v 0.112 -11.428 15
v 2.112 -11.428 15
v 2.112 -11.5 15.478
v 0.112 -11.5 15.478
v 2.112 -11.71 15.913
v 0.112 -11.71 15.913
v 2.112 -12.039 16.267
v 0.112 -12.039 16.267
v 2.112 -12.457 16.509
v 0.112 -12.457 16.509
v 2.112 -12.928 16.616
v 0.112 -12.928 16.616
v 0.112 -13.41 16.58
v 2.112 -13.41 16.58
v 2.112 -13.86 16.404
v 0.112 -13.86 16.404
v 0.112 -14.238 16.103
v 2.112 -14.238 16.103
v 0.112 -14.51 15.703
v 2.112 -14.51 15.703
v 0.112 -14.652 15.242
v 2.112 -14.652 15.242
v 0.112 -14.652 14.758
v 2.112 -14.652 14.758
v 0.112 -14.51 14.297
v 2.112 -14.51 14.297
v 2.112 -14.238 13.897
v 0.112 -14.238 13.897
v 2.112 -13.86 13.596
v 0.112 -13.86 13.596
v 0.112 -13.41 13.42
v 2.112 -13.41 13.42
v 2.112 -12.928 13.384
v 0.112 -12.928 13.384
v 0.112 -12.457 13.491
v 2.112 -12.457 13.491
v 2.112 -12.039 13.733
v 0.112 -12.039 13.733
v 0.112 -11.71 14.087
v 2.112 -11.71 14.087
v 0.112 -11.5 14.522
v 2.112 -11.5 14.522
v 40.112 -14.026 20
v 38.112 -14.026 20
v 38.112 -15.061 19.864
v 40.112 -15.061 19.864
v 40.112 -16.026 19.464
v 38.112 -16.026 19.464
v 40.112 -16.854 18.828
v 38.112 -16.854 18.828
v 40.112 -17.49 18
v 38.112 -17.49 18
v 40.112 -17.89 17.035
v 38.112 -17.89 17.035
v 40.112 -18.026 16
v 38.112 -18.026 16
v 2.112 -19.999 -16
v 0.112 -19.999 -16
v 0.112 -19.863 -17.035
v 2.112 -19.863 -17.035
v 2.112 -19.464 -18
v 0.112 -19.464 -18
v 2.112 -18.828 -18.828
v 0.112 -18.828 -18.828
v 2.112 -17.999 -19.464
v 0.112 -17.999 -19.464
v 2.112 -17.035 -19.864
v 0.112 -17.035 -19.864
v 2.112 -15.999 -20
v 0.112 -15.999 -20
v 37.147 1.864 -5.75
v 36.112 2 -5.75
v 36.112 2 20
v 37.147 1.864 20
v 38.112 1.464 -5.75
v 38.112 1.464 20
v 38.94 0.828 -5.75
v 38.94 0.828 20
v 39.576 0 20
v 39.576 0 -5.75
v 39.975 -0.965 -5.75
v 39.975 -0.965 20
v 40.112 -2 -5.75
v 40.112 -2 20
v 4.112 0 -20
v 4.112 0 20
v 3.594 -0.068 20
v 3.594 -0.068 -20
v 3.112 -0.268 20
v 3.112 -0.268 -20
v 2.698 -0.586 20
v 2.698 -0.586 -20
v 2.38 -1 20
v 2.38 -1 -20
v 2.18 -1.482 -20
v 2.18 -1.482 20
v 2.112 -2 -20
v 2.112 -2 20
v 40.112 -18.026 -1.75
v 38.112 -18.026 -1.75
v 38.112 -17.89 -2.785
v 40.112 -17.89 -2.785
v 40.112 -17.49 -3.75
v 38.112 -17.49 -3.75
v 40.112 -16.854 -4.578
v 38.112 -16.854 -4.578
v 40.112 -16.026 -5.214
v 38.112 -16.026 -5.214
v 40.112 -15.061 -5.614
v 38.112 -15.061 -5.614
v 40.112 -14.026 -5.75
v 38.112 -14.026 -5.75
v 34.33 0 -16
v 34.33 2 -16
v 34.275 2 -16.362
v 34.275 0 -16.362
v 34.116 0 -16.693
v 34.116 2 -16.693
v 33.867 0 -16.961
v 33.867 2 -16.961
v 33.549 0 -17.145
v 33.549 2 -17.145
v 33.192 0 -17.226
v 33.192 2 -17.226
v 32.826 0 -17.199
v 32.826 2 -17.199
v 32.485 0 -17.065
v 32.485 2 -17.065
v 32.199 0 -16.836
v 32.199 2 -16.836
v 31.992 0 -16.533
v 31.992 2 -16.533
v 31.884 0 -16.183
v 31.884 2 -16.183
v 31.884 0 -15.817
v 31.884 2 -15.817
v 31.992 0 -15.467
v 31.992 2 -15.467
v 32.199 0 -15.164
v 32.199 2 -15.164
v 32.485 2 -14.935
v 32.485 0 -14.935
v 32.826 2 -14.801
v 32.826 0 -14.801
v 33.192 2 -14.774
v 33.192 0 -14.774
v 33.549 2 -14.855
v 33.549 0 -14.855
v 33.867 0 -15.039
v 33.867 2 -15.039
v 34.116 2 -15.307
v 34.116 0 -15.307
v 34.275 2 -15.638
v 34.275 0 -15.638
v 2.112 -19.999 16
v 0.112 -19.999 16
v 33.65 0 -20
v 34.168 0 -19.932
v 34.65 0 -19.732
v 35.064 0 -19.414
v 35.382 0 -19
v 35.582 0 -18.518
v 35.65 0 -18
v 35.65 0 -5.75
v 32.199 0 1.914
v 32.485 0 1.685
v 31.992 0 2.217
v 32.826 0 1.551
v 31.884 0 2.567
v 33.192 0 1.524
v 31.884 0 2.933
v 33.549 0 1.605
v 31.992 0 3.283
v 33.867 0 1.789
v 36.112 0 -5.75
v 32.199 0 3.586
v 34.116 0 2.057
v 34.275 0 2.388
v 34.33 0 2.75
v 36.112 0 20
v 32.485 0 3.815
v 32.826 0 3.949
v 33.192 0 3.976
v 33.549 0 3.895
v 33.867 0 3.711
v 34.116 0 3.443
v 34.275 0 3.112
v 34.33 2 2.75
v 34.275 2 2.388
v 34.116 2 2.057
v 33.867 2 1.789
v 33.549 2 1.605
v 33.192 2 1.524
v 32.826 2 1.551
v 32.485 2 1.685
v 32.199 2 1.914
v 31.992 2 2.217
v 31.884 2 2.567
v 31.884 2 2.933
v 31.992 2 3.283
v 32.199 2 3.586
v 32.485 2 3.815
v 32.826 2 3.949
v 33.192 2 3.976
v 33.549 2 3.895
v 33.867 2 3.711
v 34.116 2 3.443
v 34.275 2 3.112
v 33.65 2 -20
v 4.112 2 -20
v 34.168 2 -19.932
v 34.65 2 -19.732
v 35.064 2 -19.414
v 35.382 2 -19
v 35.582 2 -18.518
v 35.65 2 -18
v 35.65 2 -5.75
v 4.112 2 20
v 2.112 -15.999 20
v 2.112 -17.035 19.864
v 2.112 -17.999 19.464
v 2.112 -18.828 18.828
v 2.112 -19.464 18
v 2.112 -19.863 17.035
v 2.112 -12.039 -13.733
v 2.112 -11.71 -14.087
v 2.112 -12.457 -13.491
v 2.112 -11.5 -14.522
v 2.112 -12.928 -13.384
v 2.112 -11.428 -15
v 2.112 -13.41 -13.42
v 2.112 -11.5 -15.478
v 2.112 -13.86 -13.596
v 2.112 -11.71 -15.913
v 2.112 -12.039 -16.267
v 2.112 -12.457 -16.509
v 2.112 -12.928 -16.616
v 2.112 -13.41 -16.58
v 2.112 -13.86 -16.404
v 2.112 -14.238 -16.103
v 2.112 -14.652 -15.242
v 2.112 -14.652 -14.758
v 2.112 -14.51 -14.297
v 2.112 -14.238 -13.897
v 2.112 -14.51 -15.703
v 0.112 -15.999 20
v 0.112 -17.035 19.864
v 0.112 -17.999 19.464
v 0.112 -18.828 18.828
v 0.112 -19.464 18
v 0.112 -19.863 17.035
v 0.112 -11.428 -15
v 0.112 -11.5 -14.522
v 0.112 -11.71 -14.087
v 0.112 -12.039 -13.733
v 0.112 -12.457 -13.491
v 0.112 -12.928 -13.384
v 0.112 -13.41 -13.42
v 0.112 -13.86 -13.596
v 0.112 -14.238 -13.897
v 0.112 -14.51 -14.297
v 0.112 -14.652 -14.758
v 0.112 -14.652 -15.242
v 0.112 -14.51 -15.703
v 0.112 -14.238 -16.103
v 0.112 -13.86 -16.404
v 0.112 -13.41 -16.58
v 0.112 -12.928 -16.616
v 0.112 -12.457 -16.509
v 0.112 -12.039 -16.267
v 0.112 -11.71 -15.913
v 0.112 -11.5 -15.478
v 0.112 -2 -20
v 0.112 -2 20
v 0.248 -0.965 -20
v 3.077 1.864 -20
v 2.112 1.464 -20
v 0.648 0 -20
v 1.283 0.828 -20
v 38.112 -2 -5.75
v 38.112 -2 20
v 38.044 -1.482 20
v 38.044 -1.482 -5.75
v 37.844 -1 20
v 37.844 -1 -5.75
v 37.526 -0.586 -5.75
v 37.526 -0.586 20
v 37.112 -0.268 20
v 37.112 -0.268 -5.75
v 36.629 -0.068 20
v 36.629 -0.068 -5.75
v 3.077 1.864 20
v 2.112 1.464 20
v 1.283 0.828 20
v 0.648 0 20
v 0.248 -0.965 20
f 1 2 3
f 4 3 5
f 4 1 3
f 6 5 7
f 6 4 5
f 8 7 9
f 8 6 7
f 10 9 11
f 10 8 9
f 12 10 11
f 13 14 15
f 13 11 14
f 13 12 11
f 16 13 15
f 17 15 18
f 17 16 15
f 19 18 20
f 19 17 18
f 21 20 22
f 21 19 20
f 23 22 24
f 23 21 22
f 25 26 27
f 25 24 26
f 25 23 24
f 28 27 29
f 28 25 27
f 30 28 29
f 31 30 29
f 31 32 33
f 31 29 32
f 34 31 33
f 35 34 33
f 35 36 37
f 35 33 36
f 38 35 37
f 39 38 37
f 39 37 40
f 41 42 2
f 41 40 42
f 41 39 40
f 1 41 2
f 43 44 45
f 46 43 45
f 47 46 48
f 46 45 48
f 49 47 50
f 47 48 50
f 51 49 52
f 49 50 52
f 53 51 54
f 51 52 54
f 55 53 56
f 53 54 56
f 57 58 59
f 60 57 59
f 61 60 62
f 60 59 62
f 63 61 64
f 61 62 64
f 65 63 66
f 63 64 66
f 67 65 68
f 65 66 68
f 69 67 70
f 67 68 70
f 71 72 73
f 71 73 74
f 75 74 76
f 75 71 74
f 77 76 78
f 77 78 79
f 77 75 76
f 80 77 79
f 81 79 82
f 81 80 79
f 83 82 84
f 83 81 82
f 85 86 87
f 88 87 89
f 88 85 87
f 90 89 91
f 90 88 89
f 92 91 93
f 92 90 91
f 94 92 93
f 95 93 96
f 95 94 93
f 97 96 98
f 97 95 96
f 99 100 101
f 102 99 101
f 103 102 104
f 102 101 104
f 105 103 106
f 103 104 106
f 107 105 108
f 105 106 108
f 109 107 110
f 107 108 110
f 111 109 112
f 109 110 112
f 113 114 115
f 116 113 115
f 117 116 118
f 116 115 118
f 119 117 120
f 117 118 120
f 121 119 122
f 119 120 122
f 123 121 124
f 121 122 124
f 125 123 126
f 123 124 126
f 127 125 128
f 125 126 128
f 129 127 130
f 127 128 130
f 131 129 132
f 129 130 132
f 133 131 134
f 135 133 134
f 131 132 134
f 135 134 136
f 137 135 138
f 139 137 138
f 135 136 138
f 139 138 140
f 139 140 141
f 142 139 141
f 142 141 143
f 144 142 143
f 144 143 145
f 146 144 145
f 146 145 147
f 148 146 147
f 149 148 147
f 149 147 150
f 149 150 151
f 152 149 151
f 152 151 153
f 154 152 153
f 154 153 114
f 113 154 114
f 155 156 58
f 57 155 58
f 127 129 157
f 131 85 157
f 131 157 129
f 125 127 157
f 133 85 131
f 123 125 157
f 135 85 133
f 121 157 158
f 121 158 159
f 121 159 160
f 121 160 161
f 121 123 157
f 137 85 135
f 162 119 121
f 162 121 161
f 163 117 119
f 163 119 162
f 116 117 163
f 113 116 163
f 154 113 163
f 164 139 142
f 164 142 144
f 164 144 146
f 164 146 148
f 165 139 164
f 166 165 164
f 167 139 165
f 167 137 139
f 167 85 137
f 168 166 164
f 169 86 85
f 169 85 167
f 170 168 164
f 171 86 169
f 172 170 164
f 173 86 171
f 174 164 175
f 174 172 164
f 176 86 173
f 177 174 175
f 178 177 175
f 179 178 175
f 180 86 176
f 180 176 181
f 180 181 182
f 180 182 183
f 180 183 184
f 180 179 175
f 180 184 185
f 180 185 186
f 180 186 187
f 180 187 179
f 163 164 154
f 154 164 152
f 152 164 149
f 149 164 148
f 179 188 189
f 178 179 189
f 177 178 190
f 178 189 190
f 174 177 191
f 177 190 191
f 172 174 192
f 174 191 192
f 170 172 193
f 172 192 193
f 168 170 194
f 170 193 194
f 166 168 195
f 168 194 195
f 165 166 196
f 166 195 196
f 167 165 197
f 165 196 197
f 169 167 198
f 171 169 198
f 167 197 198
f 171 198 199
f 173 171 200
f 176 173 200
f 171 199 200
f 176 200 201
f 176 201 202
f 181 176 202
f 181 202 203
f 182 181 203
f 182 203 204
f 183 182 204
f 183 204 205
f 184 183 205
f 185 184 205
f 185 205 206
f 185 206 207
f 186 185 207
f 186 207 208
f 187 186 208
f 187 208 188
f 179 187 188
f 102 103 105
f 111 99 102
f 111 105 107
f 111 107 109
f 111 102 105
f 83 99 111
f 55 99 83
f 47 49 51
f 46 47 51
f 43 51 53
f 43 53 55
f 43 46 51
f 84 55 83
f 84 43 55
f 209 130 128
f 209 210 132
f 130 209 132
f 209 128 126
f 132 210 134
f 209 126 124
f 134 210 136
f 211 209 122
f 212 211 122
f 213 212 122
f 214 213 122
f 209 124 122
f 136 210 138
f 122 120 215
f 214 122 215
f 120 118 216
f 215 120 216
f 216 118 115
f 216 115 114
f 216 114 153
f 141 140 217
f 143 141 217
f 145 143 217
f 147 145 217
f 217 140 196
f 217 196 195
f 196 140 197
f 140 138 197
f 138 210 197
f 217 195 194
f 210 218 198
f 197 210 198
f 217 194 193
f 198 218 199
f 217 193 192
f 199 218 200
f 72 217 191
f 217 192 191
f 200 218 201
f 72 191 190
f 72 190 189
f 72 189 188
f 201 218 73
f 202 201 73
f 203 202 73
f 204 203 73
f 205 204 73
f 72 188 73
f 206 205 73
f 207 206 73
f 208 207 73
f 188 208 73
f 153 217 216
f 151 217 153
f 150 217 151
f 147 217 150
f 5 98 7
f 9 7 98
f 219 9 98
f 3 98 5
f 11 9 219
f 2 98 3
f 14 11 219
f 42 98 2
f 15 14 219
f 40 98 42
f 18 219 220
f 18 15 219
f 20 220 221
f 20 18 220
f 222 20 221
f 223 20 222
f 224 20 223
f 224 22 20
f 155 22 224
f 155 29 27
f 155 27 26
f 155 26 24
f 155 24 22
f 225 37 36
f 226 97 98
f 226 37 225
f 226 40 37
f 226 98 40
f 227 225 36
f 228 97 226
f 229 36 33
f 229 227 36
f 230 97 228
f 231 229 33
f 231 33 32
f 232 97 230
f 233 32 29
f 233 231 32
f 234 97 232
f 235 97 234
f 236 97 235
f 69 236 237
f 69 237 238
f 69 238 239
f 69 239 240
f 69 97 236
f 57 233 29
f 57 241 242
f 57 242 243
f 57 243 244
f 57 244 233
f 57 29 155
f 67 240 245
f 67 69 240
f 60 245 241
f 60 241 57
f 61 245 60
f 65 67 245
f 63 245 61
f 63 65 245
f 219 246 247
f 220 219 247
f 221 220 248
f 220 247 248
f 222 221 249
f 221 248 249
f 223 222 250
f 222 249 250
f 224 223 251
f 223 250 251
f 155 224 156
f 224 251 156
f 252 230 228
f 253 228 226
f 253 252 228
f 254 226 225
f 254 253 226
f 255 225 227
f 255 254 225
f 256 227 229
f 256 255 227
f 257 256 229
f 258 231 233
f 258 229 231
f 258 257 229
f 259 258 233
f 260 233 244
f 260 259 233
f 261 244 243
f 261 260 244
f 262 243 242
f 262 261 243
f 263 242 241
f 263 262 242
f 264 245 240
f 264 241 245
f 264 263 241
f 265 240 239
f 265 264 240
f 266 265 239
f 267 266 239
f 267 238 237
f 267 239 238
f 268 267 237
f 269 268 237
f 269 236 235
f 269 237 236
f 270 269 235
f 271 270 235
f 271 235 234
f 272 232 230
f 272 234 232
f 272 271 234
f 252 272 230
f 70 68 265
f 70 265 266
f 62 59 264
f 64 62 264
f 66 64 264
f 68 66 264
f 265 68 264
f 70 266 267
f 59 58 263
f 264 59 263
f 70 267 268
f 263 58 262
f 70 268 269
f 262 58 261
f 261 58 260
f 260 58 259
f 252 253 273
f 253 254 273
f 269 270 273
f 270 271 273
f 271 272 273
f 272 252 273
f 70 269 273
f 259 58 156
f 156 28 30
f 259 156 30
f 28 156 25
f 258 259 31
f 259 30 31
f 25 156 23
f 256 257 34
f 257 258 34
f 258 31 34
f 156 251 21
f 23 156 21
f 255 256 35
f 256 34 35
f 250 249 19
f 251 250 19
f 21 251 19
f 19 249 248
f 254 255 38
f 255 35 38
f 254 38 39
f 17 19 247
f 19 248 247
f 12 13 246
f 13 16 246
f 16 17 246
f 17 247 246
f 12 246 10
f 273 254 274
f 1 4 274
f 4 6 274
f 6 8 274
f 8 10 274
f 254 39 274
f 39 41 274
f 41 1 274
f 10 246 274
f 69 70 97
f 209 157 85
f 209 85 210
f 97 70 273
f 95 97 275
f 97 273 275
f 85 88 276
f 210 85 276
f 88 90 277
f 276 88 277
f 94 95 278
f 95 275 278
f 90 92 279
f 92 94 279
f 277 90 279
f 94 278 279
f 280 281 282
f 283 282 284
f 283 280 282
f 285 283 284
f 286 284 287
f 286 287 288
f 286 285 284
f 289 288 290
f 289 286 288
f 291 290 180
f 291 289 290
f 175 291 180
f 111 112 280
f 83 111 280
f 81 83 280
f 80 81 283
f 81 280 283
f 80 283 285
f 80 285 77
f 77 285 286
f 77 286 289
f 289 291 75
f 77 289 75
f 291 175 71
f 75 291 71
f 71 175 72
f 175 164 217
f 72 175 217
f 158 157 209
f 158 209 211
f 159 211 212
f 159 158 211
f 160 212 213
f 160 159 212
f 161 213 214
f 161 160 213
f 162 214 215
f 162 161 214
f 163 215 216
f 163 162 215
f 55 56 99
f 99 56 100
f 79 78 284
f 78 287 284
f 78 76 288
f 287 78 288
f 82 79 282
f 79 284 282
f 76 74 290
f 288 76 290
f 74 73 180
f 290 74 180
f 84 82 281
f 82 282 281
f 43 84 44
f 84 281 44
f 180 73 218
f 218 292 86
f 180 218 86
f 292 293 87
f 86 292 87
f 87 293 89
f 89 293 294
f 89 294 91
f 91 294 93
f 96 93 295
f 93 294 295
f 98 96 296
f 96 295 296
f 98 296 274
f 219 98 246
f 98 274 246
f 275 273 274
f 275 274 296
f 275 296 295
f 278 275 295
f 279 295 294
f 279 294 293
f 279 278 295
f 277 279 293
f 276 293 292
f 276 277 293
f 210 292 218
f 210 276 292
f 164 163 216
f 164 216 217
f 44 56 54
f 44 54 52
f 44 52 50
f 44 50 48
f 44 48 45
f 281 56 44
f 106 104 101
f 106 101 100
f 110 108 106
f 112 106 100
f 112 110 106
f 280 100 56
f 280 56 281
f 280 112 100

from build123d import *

# Parameters (mm, degrees)
BOSS_EXTRUDE1_DEPTH        = 2
M2_CLEARANCE_HOLE1_D       = 2.459
M3_CLEARANCE_HOLE1_D       = 3.242
SKETCHED_START             = 39.700827994
SKETCHED_BEND1_OUTLINE_W   = 2
SKETCHED_BEND1_OUTLINE_H   = 25.75
SKETCHED_BEND1_DEPTH       = 17.149172006
SKETCHED_START_2           = 36.111787994
SKETCHED_BEND1_2_DEPTH     = 4
SKETCHED_START_3           = -5.75
SKETCHED_BEND1_3_DEPTH     = 25.75
SKETCHED_START_4           = -18.6
SKETCHED_BEND2_OUTLINE_W   = 2
SKETCHED_BEND2_OUTLINE_H   = 40
SKETCHED_BEND2_DEPTH       = 19.122747994
SKETCHED_START_5           = 0.752486697
SKETCHED_BEND2_2_OUTLINE_R = 1.621
SKETCHED_BEND2_2_DEPTH     = 1.359301297
SKETCHED_START_6           = 0.111787994
SKETCHED_BEND2_3_OUTLINE_R = 1.621
SKETCHED_BEND2_3_DEPTH     = 4
SKETCHED_START_7           = -20
SKETCHED_BEND2_4_DEPTH     = 40


with BuildPart() as part:
    # Sketch7 → Boss-Extrude1 (new body)
    with BuildSketch(Plane.XZ):
        with BuildLine():
            Line((35.65, -5.75), (52.85, -5.75))
            ThreePointArc((52.85, -5.75), (55.678427125, -4.578427125), (56.85, -1.75))
            Line((56.85, -1.75), (56.85, 16))
            ThreePointArc((56.85, 16), (55.678427125, 18.828427125), (52.85, 20))
            Line((52.85, 20), (-14.6, 20))
            ThreePointArc((-14.6, 20), (-17.428427125, 18.828427125), (-18.6, 16))
            Line((-18.6, 16), (-18.6, -16))
            ThreePointArc((-18.6, -16), (-17.428427125, -18.828427125), (-14.6, -20))
            Line((-14.6, -20), (33.65, -20))
            ThreePointArc((33.65, -20), (35.064213562, -19.414213562), (35.65, -18))
            Line((35.65, -18), (35.65, -5.75))
        make_face()
    extrude(amount=-BOSS_EXTRUDE1_DEPTH)

    # M2 Clearance Hole1 (through all)
    with Locations(Plane(origin=(0, 0, 0), x_dir=(-1, 0, 0), z_dir=(0, -1, 0))):
        with Locations((-33.1, 16), (-33.1, -2.75)):
            Hole(M2_CLEARANCE_HOLE1_D / 2)

    # M3 Clearance Hole1 (through all)
    with Locations(Plane(origin=(0, 2, 0), x_dir=(1, 0, 0), z_dir=(0, 1, 0))):
        with Locations((-11.65, -15), (-11.65, 15)):
            Hole(M3_CLEARANCE_HOLE1_D / 2)

    # Sketched Bend1: read off the stored shape, not the designer's step
    # Sketched Bend1 outline → Sketched Bend1 (cut)
    with BuildSketch(Plane.YZ.offset(SKETCHED_START)):
        with Locations((1, 7.125)):
            Rectangle(SKETCHED_BEND1_OUTLINE_W, SKETCHED_BEND1_OUTLINE_H)
    extrude(amount=SKETCHED_BEND1_DEPTH, mode=Mode.SUBTRACT)

    # Sketched Bend1 2 outline → Sketched Bend1 2 (add)
    with BuildSketch(Plane.YZ.offset(SKETCHED_START_2)):
        with BuildLine():
            Line((0, 20), (-14.025823026, 20))
            ThreePointArc((-14.025823026, 20), (-16.854250151, 18.828427124), (-18.025823026, 16))
            Line((-18.025823026, 16), (-18.025823026, -1.75))
            ThreePointArc((-18.025823026, -1.75), (-16.854250151, -4.578427124), (-14.025823026, -5.75))
            Line((-14.025823026, -5.75), (0, -5.75))
            Line((0, -5.75), (0, 20))
        make_face()
    extrude(amount=SKETCHED_BEND1_2_DEPTH)

    # Sketched Bend1 3 outline → Sketched Bend1 3 (cut)
    with BuildSketch(Plane.XY.offset(SKETCHED_START_3)):
        with BuildLine():
            ThreePointArc((36.111787994, 2), (38.940215119, 0.828427125), (40.111787994, -2))
            Line((40.111787994, -2), (40.111787994, 0))
            Line((40.111787994, 0), (39.700827994, 0))
            Line((39.700827994, 0), (39.700827994, 2))
            Line((39.700827994, 2), (36.111787994, 2))
        make_face()
        with BuildLine():
            Line((38.111787994, -18.025823026), (38.111787994, -2))
            ThreePointArc((38.111787994, -2), (37.526001556, -0.585786438), (36.111787994, 0))
            Line((36.111787994, 0), (36.111787994, -18.025823026))
            Line((36.111787994, -18.025823026), (38.111787994, -18.025823026))
        make_face()
    extrude(amount=SKETCHED_BEND1_3_DEPTH, mode=Mode.SUBTRACT)

    # Sketched Bend2: read off the stored shape, not the designer's step
    # Sketched Bend2 outline → Sketched Bend2 (cut)
    with BuildSketch(Plane.YZ.offset(SKETCHED_START_4)):
        with Locations((1, 0)):
            Rectangle(SKETCHED_BEND2_OUTLINE_W, SKETCHED_BEND2_OUTLINE_H)
    extrude(amount=SKETCHED_BEND2_DEPTH, mode=Mode.SUBTRACT)

    # Sketched Bend2 2 outline → Sketched Bend2 2 (add)
    with BuildSketch(Plane.YZ.offset(SKETCHED_START_5)):
        with BuildLine():
            Line((0, 20), (-15.999399014, 20))
            ThreePointArc((-15.999399014, 20), (-18.827826139, 18.828427125), (-19.999399014, 16))
            Line((-19.999399014, 16), (-19.999399014, -16))
            ThreePointArc((-19.999399014, -16), (-18.827826139, -18.828427124), (-15.999399014, -20))
            Line((-15.999399014, -20), (0, -20))
            Line((0, -20), (0, 20))
        make_face()
        with Locations((-13.049399014, -15)):
            Circle(SKETCHED_BEND2_2_OUTLINE_R, mode=Mode.SUBTRACT)
        with Locations((-13.049399014, 15)):
            Circle(SKETCHED_BEND2_2_OUTLINE_R, mode=Mode.SUBTRACT)
    extrude(amount=SKETCHED_BEND2_2_DEPTH)

    # Sketched Bend2 3 outline → Sketched Bend2 3 (add)
    with BuildSketch(Plane.YZ.offset(SKETCHED_START_6)):
        with BuildLine():
            Line((0, 20), (-15.999399014, 20))
            ThreePointArc((-15.999399014, 20), (-18.827826139, 18.828427125), (-19.999399014, 16))
            Line((-19.999399014, 16), (-19.999399014, -16))
            ThreePointArc((-19.999399014, -16), (-18.827826139, -18.828427124), (-15.999399014, -20))
            Line((-15.999399014, -20), (0, -20))
            Line((0, -20), (0, 20))
        make_face()
        with Locations((-13.049399014, -15)):
            Circle(SKETCHED_BEND2_3_OUTLINE_R, mode=Mode.SUBTRACT)
        with Locations((-13.049399014, 15)):
            Circle(SKETCHED_BEND2_3_OUTLINE_R, mode=Mode.SUBTRACT)
    extrude(amount=SKETCHED_BEND2_3_DEPTH)

    # Sketched Bend2 4 outline → Sketched Bend2 4 (cut)
    with BuildSketch(Plane.XY.offset(SKETCHED_START_7)):
        with BuildLine():
            Line((0.111787994, 0), (0.111787994, -2))
            ThreePointArc((0.111787994, -2), (1.283360869, 0.828427125), (4.111787994, 2))
            Line((4.111787994, 2), (0.522747994, 2))
            Line((0.522747994, 2), (0.522747994, 0))
            Line((0.522747994, 0), (0.111787994, 0))
        make_face()
        with BuildLine():
            ThreePointArc((4.111787994, 0), (2.697574432, -0.585786438), (2.111787994, -2))
            Line((2.111787994, -2), (2.111787994, -19.999399014))
            Line((2.111787994, -19.999399014), (4.111787994, -19.999399014))
            Line((4.111787994, -19.999399014), (4.111787994, 0))
        make_face()
    extrude(amount=SKETCHED_BEND2_4_DEPTH, mode=Mode.SUBTRACT)


solid = part.part
